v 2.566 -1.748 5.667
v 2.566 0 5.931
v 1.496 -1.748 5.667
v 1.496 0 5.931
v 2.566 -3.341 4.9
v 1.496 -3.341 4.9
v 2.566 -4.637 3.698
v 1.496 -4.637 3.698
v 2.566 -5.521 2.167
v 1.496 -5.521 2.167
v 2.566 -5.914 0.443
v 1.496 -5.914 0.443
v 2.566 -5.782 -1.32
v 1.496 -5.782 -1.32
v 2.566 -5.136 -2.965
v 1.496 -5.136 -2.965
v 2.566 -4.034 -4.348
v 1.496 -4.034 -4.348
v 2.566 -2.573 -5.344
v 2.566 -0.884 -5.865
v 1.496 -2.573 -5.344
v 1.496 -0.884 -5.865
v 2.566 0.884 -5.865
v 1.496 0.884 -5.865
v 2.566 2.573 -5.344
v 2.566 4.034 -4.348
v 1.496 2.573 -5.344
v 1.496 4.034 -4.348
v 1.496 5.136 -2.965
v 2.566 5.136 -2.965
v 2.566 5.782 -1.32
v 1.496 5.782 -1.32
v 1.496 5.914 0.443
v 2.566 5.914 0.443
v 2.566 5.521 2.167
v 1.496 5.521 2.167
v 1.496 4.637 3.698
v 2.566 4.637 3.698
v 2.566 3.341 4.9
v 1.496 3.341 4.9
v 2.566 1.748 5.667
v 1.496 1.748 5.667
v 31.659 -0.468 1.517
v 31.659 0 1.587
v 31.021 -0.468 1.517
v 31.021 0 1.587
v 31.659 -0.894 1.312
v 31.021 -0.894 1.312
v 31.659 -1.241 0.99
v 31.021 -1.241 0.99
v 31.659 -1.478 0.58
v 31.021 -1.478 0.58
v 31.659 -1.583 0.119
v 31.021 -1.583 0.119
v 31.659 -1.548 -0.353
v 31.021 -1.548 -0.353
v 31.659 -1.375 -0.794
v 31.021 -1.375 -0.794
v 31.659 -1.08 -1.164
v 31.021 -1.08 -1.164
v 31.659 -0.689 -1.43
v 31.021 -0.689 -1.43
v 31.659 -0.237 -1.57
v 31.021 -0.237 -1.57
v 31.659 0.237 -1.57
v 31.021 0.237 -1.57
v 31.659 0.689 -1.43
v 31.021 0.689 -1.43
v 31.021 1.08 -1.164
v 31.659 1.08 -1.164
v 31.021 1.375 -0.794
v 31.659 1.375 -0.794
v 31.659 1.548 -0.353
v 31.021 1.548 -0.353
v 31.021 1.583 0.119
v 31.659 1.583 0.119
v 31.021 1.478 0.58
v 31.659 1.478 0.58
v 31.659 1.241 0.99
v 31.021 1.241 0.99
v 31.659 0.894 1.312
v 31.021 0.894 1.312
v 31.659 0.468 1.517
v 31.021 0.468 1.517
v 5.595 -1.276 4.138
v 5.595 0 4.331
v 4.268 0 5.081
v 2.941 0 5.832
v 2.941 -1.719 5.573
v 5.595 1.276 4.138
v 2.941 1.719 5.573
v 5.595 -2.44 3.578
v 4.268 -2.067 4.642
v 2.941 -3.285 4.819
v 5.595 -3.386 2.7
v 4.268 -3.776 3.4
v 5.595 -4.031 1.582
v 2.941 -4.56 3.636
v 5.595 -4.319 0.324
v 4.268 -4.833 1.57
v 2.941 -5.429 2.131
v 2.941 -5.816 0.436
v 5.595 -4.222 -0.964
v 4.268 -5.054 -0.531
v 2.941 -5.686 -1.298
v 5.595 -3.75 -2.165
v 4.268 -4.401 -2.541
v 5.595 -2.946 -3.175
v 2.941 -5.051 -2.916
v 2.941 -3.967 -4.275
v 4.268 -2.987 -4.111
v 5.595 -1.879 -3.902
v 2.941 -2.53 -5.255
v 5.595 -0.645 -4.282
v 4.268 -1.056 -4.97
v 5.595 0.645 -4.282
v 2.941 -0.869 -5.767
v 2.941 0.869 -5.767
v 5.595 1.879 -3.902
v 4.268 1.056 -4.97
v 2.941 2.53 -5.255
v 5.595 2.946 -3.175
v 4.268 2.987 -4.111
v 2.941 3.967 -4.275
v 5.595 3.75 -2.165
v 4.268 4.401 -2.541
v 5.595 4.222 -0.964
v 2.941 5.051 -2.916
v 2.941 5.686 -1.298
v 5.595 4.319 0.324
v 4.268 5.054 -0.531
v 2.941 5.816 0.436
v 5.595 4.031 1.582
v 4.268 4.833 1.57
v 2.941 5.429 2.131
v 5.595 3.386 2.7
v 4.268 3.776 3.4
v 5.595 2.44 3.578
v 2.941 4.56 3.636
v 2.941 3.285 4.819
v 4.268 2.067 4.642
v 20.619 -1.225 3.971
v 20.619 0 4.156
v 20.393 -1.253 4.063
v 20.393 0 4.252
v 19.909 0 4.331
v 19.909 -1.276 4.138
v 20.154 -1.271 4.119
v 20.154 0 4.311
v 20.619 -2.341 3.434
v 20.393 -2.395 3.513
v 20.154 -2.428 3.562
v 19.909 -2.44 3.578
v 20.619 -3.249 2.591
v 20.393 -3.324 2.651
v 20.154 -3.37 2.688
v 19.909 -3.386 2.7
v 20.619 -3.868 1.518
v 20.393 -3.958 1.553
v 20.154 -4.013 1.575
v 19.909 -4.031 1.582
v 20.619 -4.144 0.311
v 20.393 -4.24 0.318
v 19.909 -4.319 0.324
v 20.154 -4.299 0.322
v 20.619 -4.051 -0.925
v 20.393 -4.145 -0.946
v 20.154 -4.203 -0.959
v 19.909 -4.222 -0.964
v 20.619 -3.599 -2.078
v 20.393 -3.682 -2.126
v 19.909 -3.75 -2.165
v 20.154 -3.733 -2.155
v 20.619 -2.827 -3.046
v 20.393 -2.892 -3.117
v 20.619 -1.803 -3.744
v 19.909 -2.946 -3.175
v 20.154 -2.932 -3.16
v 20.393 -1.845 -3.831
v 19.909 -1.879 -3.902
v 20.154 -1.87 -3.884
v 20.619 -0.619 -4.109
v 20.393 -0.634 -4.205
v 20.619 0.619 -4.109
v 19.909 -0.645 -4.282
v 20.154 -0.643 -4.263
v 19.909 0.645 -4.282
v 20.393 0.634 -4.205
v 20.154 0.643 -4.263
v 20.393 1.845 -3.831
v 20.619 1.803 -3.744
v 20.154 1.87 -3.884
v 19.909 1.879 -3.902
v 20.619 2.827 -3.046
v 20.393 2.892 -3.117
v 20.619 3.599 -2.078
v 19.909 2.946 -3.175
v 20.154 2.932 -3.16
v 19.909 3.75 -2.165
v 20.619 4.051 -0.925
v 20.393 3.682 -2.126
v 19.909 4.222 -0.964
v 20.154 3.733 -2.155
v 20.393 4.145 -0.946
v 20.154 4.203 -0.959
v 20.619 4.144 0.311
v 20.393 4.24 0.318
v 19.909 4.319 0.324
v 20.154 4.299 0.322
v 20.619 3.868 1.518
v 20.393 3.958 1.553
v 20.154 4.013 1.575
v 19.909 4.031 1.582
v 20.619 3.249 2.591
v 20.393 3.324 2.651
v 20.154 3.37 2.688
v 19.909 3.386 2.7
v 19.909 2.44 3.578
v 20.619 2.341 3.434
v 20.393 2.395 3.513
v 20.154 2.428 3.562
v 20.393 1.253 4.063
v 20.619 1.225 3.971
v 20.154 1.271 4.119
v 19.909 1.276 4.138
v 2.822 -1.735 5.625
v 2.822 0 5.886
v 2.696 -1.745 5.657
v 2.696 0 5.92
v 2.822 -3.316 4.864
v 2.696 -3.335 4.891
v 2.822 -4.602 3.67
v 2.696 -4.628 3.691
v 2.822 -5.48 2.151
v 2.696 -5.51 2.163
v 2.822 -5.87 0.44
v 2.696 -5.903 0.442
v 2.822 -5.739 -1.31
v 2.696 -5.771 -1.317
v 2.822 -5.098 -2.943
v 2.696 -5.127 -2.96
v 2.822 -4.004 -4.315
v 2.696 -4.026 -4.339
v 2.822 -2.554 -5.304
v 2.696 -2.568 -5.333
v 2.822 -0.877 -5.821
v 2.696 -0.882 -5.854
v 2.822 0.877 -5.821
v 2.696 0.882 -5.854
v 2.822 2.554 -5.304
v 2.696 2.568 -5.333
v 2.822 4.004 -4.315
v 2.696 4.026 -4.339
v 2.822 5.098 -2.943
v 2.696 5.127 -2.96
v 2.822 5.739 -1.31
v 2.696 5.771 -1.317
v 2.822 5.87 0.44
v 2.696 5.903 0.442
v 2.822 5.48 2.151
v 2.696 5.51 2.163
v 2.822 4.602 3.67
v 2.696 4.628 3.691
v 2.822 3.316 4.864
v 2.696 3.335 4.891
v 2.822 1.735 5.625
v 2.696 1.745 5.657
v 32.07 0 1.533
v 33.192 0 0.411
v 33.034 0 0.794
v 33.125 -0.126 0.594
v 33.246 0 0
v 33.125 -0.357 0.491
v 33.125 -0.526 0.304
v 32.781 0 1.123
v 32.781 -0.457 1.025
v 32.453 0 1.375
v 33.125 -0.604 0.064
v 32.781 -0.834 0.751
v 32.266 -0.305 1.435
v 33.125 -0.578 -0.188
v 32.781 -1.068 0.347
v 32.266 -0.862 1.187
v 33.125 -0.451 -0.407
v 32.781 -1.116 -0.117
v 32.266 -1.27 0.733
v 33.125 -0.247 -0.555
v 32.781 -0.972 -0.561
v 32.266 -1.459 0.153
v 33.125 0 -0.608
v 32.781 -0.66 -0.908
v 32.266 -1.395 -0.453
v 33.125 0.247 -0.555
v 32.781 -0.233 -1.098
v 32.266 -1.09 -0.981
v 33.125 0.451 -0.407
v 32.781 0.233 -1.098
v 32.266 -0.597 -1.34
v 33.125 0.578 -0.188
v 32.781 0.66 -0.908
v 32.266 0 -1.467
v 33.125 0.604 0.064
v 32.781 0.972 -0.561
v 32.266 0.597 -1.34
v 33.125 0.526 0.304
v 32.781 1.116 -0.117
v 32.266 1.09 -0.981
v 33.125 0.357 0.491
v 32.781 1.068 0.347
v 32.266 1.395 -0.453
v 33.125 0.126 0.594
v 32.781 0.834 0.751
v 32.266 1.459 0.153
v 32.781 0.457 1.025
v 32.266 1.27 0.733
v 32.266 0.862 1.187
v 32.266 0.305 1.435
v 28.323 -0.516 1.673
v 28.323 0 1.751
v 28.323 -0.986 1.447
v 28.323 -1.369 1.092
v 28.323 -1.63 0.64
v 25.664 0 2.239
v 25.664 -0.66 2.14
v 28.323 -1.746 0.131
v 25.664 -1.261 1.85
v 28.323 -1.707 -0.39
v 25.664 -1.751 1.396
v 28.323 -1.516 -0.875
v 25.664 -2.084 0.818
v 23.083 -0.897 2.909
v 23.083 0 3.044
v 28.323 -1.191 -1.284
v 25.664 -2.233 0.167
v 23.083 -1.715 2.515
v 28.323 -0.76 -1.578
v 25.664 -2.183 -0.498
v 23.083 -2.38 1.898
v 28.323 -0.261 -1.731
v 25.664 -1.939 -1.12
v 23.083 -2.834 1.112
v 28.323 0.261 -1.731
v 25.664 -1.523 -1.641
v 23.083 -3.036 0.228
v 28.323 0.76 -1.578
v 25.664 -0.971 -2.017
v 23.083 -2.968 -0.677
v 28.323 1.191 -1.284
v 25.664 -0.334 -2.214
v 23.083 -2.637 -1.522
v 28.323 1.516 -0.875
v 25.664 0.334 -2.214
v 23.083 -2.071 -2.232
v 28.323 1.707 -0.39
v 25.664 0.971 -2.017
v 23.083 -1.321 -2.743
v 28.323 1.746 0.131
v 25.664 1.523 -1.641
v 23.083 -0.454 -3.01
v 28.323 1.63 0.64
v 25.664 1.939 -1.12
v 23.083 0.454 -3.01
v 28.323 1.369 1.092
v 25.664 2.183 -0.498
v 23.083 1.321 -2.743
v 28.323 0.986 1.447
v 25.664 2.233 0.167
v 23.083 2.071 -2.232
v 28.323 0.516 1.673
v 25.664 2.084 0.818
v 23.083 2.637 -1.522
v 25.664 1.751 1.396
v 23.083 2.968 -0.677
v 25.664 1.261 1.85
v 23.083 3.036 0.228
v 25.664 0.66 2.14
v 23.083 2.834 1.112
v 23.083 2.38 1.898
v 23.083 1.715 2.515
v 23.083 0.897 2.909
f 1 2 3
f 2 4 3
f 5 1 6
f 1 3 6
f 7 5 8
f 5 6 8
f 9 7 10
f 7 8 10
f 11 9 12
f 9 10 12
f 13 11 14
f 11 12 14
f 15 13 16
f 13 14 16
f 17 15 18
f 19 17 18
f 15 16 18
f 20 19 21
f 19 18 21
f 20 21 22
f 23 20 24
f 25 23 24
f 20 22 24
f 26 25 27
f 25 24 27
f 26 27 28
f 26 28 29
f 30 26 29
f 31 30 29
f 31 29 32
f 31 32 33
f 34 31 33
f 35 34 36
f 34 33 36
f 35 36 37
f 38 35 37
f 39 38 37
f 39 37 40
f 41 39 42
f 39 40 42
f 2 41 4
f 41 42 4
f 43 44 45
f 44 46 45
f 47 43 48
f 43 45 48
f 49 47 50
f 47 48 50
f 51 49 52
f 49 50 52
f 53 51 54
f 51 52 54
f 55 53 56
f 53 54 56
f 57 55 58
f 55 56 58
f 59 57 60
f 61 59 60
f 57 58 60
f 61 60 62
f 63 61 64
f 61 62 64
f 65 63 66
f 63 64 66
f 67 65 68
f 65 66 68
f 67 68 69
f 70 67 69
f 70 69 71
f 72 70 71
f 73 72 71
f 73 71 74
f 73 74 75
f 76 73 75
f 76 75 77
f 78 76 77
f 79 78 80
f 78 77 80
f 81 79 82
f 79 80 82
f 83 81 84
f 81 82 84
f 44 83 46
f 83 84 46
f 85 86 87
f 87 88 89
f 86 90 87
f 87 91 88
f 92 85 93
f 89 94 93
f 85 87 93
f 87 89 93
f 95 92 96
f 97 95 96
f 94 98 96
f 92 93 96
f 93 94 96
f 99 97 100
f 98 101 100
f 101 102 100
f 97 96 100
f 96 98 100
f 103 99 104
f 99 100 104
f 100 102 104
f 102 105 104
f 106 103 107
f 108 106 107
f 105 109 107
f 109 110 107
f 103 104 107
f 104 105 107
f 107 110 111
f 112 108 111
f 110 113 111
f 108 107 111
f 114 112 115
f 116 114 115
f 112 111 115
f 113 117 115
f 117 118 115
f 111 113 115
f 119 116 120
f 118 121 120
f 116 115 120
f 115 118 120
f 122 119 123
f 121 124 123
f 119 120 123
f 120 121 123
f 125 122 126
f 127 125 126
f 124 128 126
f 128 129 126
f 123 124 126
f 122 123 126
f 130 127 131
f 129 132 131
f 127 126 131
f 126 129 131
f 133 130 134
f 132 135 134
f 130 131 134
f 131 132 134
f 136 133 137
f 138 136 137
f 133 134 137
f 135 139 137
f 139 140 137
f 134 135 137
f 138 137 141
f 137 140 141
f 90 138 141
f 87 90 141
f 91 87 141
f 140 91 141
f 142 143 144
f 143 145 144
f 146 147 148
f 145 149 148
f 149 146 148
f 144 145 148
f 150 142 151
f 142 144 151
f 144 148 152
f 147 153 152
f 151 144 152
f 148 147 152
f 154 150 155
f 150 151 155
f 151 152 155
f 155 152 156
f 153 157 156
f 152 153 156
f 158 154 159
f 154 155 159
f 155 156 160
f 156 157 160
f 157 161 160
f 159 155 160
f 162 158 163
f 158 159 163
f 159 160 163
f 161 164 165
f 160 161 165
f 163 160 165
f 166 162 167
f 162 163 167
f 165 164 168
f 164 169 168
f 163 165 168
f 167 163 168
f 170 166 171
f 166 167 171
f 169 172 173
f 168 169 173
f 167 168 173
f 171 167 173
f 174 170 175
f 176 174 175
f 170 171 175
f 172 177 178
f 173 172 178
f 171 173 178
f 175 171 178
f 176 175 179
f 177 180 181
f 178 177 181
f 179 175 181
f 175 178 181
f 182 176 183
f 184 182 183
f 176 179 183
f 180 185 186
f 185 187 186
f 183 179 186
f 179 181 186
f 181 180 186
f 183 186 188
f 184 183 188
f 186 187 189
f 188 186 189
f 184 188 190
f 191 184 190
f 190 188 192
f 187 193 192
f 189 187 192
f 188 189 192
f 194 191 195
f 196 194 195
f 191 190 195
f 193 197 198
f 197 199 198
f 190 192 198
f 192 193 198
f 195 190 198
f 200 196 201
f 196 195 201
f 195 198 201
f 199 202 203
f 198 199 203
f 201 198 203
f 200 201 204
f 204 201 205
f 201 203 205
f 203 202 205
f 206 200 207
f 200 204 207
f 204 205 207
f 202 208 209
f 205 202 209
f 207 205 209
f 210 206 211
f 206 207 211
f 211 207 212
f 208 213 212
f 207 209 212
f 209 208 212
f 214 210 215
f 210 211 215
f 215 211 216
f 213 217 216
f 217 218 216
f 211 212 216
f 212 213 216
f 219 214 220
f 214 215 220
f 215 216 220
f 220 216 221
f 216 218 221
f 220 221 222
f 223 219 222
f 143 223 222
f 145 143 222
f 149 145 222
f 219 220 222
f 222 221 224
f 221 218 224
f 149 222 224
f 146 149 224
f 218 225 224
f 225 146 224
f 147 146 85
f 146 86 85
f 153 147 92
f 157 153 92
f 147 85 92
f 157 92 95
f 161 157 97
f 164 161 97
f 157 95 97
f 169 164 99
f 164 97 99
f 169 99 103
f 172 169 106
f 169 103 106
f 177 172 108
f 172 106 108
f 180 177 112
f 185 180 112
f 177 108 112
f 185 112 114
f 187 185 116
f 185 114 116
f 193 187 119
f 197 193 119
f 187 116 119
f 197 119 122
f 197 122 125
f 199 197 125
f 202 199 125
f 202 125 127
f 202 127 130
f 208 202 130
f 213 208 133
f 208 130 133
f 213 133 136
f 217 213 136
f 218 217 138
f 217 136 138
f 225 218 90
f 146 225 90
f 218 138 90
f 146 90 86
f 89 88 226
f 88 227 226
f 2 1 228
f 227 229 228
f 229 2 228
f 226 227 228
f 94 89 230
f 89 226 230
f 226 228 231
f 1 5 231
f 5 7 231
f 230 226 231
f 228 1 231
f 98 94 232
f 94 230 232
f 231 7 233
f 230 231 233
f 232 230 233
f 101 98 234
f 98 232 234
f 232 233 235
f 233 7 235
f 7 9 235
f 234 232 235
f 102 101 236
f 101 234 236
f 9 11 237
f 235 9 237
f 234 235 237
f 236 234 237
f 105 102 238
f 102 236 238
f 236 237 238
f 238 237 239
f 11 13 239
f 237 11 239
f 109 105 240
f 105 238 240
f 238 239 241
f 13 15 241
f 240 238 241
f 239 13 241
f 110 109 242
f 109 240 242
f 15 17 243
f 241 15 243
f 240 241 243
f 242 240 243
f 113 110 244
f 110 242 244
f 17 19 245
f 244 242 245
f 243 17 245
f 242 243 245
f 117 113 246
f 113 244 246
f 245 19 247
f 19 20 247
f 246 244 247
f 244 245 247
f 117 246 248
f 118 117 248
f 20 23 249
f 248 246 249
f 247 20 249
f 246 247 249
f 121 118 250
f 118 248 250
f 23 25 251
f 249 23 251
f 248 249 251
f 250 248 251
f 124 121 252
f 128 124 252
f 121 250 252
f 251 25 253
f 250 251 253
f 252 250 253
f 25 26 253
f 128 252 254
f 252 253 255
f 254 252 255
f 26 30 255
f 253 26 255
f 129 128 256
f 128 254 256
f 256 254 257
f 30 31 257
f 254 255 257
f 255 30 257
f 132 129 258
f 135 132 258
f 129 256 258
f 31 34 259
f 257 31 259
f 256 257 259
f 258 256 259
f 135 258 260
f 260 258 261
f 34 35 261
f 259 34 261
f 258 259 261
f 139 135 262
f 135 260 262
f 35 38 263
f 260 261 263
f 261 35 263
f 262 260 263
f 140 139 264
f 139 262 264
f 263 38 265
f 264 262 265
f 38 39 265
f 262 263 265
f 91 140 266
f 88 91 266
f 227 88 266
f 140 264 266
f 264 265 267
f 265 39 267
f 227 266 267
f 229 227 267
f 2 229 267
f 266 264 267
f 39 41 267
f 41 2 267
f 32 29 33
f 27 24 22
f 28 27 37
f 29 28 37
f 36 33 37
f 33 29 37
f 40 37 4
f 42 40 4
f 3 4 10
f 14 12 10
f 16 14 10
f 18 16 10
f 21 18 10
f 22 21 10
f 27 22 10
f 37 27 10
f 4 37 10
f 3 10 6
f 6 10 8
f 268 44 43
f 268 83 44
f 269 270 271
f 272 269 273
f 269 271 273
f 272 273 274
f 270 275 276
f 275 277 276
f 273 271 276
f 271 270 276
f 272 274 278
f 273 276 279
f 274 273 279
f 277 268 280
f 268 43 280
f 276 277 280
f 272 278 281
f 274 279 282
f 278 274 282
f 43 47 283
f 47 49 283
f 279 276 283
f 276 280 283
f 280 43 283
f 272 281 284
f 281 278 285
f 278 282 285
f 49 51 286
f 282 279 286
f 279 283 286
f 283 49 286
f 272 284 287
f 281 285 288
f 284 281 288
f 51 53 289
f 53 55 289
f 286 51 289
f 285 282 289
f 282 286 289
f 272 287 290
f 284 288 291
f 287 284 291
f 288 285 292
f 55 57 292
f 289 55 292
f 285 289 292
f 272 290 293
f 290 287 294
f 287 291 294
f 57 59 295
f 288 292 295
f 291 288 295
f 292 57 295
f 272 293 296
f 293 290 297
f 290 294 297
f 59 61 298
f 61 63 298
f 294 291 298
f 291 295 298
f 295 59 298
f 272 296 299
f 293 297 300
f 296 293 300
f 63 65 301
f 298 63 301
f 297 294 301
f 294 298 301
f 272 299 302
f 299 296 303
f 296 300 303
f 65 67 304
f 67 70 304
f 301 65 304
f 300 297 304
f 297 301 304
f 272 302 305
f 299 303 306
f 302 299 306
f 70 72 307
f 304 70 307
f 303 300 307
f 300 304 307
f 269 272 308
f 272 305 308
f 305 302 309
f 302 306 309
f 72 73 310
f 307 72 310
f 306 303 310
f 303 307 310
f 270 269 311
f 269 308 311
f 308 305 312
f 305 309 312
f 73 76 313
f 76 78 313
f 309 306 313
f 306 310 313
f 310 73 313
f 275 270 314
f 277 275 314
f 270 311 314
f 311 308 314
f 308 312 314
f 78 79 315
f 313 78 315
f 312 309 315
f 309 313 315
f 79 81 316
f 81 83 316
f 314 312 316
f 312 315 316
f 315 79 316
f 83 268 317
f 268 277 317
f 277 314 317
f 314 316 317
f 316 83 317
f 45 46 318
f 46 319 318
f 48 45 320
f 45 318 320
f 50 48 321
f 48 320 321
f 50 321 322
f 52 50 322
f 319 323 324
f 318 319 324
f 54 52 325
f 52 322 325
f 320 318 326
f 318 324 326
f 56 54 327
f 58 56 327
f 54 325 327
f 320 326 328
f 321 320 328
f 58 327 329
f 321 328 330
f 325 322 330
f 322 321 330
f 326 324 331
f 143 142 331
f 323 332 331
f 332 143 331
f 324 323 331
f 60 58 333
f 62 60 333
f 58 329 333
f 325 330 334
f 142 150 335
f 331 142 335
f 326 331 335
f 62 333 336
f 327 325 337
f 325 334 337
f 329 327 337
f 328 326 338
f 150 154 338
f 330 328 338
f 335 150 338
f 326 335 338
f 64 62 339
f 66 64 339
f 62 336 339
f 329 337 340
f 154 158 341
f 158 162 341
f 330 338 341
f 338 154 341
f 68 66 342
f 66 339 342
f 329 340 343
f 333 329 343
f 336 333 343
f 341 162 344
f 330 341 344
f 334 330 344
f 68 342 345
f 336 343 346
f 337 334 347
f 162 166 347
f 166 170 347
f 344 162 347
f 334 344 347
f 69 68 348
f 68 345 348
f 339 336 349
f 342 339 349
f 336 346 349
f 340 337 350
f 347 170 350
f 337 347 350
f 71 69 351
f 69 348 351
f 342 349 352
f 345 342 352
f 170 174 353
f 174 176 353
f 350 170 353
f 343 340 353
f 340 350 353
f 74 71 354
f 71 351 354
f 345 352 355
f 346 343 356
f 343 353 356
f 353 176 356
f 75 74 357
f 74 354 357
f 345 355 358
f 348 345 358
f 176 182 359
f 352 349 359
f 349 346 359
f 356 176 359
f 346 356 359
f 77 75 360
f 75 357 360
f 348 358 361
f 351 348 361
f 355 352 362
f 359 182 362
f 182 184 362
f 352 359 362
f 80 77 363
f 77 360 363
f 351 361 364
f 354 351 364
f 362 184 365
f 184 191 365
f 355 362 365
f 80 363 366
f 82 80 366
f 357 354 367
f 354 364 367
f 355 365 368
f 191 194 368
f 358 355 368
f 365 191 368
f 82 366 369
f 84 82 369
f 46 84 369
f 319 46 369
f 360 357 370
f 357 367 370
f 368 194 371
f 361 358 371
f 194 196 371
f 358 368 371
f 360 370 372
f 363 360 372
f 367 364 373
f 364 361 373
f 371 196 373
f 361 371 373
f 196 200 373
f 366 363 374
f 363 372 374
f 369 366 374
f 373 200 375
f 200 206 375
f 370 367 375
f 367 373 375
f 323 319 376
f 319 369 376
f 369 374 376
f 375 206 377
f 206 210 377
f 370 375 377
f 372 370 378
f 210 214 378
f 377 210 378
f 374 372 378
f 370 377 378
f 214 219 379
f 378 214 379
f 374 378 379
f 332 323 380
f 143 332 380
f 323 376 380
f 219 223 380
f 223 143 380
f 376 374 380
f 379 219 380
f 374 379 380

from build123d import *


with BuildPart() as part:
    # Sketch1 → Revolve2 (revolve)
    with BuildSketch(Plane.XY, mode=Mode.PRIVATE) as revolve2_sk:
        with BuildLine():
            Line((1.496304491, 5.9309), (1.496304491, 0))
            Line((1.496304491, 0), (31.087304489, 0))
            Line((31.087304489, 0), (31.658804491, 0))
            Line((31.658804491, 0), (32.230304494, 0))
            Line((32.230304494, 0), (33.246304491, 0))
            ThreePointArc((33.246304491, 0), (32.781336507, 1.122532015), (31.658804491, 1.5875))
            Line((31.658804491, 1.5875), (31.021091308, 1.5875))
            ThreePointArc((31.021091308, 1.5875), (25.663749675, 2.239020867), (20.618721916, 4.155602128))
            ThreePointArc((20.618721916, 4.155602128), (20.27474275, 4.286278123), (19.909469457, 4.3307))
            Line((19.909469457, 4.3307), (5.594648416, 4.3307))
            Line((5.594648416, 4.3307), (2.940913387, 5.83211104))
            ThreePointArc((2.940913387, 5.83211104), (2.759693318, 5.905789005), (2.565686634, 5.9309))
            Line((2.565686634, 5.9309), (1.496304491, 5.9309))
        make_face()
    revolve(revolve2_sk.sketch.rotate(Axis((0, 0, 0), (1, 0, 0)), 90), axis=Axis((0, 0, 0), (1, 0, 0)))  # turned: the seam where the file's is


solid = part.part
